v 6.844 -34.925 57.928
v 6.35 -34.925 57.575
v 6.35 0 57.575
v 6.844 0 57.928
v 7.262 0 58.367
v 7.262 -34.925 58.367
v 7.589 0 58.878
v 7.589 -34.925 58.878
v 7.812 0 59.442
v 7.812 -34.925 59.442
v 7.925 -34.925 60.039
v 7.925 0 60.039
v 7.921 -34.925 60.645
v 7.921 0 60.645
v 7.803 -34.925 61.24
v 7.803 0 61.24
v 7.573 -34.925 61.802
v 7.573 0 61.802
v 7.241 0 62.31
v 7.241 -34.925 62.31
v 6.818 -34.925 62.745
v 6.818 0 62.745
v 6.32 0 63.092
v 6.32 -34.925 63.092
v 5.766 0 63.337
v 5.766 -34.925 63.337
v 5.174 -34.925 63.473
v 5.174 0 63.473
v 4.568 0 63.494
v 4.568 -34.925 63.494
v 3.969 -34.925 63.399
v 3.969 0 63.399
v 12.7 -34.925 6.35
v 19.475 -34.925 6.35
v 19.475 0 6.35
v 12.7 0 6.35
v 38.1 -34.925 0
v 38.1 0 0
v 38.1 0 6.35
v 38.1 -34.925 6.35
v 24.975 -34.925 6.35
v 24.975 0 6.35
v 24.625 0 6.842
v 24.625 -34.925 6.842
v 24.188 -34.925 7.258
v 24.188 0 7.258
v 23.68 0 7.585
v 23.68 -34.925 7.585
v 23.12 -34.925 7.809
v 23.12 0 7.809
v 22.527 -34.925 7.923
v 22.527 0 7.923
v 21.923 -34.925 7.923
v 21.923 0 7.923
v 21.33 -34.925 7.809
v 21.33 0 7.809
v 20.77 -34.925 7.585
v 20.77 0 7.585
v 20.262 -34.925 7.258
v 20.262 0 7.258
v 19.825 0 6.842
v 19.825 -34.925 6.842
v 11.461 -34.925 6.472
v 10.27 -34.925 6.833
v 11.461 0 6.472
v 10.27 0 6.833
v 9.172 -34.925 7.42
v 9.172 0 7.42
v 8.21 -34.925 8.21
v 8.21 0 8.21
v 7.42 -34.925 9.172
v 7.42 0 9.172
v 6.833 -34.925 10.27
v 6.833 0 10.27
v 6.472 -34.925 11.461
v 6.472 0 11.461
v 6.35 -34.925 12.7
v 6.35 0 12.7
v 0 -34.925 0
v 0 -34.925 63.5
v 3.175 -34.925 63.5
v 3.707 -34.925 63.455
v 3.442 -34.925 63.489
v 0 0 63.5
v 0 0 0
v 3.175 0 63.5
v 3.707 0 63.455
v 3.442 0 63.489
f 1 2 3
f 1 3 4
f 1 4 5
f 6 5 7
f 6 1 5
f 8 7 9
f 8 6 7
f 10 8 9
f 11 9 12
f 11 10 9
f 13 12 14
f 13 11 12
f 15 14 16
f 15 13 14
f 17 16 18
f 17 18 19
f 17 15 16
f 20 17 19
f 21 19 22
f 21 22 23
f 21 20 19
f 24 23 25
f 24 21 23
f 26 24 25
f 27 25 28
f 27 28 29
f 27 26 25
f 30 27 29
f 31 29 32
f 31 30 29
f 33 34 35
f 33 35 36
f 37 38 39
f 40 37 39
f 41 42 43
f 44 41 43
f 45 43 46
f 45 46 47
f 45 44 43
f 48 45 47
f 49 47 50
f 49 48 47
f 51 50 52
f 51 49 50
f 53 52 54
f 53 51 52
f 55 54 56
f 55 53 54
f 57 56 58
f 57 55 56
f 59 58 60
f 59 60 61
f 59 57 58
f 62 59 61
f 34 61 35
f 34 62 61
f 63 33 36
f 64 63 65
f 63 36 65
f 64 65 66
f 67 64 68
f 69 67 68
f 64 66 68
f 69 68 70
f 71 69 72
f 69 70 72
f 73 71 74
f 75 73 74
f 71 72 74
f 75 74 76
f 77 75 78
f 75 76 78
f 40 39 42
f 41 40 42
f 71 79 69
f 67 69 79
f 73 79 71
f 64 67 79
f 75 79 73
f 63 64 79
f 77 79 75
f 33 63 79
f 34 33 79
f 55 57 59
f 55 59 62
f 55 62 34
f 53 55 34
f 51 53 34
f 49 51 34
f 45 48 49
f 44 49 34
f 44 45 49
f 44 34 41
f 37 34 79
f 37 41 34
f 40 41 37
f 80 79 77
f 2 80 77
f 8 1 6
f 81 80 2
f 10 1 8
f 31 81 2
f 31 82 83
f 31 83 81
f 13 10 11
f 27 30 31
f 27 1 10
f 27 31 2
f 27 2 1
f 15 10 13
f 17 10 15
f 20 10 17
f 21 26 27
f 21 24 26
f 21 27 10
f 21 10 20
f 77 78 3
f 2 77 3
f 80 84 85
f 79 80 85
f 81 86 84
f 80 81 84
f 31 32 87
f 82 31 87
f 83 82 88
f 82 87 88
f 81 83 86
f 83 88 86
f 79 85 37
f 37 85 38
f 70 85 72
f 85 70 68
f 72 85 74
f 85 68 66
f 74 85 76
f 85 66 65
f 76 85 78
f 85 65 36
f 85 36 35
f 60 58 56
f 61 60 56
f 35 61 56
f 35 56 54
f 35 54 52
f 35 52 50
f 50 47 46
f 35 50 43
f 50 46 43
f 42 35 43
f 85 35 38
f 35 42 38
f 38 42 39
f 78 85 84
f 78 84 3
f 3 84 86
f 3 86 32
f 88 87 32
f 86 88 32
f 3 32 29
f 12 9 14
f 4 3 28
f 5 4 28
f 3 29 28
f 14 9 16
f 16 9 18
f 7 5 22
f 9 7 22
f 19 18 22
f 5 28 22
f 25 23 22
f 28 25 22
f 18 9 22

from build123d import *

# Parameters (mm, degrees)
F1_DEPTH = 34.925
F2_R     = 3.175
F3_DEPTH = 34.925


with BuildPart() as f1:
    # F0 (on Front) → F1 (new body)
    with BuildSketch(Plane.XZ):
        with BuildLine():
            Line((3.175, 63.5), (0, 63.5))
            Line((0, 63.5), (0, 0))
            Line((0, 0), (38.1, 0))
            Line((38.1, 0), (38.1, 6.35))
            Line((38.1, 6.35), (12.7, 6.35))
            ThreePointArc((12.7, 6.35), (8.209872, 8.209872), (6.35, 12.7))
            Line((6.35, 12.7), (6.35, 60.325))
            ThreePointArc((6.35, 60.325), (5.420064, 62.570064), (3.175, 63.5))
        make_face()
    extrude(amount=F1_DEPTH)

    # F2 (on face) → F3 (join, through all)
    with BuildSketch(Plane.XZ.offset(34.925)):
        with Locations((4.7625, 60.325)):
            Circle(F2_R)
        with Locations((22.225, 4.7625)):
            Circle(F2_R)
    extrude(amount=-F3_DEPTH)


solid = f1.part
